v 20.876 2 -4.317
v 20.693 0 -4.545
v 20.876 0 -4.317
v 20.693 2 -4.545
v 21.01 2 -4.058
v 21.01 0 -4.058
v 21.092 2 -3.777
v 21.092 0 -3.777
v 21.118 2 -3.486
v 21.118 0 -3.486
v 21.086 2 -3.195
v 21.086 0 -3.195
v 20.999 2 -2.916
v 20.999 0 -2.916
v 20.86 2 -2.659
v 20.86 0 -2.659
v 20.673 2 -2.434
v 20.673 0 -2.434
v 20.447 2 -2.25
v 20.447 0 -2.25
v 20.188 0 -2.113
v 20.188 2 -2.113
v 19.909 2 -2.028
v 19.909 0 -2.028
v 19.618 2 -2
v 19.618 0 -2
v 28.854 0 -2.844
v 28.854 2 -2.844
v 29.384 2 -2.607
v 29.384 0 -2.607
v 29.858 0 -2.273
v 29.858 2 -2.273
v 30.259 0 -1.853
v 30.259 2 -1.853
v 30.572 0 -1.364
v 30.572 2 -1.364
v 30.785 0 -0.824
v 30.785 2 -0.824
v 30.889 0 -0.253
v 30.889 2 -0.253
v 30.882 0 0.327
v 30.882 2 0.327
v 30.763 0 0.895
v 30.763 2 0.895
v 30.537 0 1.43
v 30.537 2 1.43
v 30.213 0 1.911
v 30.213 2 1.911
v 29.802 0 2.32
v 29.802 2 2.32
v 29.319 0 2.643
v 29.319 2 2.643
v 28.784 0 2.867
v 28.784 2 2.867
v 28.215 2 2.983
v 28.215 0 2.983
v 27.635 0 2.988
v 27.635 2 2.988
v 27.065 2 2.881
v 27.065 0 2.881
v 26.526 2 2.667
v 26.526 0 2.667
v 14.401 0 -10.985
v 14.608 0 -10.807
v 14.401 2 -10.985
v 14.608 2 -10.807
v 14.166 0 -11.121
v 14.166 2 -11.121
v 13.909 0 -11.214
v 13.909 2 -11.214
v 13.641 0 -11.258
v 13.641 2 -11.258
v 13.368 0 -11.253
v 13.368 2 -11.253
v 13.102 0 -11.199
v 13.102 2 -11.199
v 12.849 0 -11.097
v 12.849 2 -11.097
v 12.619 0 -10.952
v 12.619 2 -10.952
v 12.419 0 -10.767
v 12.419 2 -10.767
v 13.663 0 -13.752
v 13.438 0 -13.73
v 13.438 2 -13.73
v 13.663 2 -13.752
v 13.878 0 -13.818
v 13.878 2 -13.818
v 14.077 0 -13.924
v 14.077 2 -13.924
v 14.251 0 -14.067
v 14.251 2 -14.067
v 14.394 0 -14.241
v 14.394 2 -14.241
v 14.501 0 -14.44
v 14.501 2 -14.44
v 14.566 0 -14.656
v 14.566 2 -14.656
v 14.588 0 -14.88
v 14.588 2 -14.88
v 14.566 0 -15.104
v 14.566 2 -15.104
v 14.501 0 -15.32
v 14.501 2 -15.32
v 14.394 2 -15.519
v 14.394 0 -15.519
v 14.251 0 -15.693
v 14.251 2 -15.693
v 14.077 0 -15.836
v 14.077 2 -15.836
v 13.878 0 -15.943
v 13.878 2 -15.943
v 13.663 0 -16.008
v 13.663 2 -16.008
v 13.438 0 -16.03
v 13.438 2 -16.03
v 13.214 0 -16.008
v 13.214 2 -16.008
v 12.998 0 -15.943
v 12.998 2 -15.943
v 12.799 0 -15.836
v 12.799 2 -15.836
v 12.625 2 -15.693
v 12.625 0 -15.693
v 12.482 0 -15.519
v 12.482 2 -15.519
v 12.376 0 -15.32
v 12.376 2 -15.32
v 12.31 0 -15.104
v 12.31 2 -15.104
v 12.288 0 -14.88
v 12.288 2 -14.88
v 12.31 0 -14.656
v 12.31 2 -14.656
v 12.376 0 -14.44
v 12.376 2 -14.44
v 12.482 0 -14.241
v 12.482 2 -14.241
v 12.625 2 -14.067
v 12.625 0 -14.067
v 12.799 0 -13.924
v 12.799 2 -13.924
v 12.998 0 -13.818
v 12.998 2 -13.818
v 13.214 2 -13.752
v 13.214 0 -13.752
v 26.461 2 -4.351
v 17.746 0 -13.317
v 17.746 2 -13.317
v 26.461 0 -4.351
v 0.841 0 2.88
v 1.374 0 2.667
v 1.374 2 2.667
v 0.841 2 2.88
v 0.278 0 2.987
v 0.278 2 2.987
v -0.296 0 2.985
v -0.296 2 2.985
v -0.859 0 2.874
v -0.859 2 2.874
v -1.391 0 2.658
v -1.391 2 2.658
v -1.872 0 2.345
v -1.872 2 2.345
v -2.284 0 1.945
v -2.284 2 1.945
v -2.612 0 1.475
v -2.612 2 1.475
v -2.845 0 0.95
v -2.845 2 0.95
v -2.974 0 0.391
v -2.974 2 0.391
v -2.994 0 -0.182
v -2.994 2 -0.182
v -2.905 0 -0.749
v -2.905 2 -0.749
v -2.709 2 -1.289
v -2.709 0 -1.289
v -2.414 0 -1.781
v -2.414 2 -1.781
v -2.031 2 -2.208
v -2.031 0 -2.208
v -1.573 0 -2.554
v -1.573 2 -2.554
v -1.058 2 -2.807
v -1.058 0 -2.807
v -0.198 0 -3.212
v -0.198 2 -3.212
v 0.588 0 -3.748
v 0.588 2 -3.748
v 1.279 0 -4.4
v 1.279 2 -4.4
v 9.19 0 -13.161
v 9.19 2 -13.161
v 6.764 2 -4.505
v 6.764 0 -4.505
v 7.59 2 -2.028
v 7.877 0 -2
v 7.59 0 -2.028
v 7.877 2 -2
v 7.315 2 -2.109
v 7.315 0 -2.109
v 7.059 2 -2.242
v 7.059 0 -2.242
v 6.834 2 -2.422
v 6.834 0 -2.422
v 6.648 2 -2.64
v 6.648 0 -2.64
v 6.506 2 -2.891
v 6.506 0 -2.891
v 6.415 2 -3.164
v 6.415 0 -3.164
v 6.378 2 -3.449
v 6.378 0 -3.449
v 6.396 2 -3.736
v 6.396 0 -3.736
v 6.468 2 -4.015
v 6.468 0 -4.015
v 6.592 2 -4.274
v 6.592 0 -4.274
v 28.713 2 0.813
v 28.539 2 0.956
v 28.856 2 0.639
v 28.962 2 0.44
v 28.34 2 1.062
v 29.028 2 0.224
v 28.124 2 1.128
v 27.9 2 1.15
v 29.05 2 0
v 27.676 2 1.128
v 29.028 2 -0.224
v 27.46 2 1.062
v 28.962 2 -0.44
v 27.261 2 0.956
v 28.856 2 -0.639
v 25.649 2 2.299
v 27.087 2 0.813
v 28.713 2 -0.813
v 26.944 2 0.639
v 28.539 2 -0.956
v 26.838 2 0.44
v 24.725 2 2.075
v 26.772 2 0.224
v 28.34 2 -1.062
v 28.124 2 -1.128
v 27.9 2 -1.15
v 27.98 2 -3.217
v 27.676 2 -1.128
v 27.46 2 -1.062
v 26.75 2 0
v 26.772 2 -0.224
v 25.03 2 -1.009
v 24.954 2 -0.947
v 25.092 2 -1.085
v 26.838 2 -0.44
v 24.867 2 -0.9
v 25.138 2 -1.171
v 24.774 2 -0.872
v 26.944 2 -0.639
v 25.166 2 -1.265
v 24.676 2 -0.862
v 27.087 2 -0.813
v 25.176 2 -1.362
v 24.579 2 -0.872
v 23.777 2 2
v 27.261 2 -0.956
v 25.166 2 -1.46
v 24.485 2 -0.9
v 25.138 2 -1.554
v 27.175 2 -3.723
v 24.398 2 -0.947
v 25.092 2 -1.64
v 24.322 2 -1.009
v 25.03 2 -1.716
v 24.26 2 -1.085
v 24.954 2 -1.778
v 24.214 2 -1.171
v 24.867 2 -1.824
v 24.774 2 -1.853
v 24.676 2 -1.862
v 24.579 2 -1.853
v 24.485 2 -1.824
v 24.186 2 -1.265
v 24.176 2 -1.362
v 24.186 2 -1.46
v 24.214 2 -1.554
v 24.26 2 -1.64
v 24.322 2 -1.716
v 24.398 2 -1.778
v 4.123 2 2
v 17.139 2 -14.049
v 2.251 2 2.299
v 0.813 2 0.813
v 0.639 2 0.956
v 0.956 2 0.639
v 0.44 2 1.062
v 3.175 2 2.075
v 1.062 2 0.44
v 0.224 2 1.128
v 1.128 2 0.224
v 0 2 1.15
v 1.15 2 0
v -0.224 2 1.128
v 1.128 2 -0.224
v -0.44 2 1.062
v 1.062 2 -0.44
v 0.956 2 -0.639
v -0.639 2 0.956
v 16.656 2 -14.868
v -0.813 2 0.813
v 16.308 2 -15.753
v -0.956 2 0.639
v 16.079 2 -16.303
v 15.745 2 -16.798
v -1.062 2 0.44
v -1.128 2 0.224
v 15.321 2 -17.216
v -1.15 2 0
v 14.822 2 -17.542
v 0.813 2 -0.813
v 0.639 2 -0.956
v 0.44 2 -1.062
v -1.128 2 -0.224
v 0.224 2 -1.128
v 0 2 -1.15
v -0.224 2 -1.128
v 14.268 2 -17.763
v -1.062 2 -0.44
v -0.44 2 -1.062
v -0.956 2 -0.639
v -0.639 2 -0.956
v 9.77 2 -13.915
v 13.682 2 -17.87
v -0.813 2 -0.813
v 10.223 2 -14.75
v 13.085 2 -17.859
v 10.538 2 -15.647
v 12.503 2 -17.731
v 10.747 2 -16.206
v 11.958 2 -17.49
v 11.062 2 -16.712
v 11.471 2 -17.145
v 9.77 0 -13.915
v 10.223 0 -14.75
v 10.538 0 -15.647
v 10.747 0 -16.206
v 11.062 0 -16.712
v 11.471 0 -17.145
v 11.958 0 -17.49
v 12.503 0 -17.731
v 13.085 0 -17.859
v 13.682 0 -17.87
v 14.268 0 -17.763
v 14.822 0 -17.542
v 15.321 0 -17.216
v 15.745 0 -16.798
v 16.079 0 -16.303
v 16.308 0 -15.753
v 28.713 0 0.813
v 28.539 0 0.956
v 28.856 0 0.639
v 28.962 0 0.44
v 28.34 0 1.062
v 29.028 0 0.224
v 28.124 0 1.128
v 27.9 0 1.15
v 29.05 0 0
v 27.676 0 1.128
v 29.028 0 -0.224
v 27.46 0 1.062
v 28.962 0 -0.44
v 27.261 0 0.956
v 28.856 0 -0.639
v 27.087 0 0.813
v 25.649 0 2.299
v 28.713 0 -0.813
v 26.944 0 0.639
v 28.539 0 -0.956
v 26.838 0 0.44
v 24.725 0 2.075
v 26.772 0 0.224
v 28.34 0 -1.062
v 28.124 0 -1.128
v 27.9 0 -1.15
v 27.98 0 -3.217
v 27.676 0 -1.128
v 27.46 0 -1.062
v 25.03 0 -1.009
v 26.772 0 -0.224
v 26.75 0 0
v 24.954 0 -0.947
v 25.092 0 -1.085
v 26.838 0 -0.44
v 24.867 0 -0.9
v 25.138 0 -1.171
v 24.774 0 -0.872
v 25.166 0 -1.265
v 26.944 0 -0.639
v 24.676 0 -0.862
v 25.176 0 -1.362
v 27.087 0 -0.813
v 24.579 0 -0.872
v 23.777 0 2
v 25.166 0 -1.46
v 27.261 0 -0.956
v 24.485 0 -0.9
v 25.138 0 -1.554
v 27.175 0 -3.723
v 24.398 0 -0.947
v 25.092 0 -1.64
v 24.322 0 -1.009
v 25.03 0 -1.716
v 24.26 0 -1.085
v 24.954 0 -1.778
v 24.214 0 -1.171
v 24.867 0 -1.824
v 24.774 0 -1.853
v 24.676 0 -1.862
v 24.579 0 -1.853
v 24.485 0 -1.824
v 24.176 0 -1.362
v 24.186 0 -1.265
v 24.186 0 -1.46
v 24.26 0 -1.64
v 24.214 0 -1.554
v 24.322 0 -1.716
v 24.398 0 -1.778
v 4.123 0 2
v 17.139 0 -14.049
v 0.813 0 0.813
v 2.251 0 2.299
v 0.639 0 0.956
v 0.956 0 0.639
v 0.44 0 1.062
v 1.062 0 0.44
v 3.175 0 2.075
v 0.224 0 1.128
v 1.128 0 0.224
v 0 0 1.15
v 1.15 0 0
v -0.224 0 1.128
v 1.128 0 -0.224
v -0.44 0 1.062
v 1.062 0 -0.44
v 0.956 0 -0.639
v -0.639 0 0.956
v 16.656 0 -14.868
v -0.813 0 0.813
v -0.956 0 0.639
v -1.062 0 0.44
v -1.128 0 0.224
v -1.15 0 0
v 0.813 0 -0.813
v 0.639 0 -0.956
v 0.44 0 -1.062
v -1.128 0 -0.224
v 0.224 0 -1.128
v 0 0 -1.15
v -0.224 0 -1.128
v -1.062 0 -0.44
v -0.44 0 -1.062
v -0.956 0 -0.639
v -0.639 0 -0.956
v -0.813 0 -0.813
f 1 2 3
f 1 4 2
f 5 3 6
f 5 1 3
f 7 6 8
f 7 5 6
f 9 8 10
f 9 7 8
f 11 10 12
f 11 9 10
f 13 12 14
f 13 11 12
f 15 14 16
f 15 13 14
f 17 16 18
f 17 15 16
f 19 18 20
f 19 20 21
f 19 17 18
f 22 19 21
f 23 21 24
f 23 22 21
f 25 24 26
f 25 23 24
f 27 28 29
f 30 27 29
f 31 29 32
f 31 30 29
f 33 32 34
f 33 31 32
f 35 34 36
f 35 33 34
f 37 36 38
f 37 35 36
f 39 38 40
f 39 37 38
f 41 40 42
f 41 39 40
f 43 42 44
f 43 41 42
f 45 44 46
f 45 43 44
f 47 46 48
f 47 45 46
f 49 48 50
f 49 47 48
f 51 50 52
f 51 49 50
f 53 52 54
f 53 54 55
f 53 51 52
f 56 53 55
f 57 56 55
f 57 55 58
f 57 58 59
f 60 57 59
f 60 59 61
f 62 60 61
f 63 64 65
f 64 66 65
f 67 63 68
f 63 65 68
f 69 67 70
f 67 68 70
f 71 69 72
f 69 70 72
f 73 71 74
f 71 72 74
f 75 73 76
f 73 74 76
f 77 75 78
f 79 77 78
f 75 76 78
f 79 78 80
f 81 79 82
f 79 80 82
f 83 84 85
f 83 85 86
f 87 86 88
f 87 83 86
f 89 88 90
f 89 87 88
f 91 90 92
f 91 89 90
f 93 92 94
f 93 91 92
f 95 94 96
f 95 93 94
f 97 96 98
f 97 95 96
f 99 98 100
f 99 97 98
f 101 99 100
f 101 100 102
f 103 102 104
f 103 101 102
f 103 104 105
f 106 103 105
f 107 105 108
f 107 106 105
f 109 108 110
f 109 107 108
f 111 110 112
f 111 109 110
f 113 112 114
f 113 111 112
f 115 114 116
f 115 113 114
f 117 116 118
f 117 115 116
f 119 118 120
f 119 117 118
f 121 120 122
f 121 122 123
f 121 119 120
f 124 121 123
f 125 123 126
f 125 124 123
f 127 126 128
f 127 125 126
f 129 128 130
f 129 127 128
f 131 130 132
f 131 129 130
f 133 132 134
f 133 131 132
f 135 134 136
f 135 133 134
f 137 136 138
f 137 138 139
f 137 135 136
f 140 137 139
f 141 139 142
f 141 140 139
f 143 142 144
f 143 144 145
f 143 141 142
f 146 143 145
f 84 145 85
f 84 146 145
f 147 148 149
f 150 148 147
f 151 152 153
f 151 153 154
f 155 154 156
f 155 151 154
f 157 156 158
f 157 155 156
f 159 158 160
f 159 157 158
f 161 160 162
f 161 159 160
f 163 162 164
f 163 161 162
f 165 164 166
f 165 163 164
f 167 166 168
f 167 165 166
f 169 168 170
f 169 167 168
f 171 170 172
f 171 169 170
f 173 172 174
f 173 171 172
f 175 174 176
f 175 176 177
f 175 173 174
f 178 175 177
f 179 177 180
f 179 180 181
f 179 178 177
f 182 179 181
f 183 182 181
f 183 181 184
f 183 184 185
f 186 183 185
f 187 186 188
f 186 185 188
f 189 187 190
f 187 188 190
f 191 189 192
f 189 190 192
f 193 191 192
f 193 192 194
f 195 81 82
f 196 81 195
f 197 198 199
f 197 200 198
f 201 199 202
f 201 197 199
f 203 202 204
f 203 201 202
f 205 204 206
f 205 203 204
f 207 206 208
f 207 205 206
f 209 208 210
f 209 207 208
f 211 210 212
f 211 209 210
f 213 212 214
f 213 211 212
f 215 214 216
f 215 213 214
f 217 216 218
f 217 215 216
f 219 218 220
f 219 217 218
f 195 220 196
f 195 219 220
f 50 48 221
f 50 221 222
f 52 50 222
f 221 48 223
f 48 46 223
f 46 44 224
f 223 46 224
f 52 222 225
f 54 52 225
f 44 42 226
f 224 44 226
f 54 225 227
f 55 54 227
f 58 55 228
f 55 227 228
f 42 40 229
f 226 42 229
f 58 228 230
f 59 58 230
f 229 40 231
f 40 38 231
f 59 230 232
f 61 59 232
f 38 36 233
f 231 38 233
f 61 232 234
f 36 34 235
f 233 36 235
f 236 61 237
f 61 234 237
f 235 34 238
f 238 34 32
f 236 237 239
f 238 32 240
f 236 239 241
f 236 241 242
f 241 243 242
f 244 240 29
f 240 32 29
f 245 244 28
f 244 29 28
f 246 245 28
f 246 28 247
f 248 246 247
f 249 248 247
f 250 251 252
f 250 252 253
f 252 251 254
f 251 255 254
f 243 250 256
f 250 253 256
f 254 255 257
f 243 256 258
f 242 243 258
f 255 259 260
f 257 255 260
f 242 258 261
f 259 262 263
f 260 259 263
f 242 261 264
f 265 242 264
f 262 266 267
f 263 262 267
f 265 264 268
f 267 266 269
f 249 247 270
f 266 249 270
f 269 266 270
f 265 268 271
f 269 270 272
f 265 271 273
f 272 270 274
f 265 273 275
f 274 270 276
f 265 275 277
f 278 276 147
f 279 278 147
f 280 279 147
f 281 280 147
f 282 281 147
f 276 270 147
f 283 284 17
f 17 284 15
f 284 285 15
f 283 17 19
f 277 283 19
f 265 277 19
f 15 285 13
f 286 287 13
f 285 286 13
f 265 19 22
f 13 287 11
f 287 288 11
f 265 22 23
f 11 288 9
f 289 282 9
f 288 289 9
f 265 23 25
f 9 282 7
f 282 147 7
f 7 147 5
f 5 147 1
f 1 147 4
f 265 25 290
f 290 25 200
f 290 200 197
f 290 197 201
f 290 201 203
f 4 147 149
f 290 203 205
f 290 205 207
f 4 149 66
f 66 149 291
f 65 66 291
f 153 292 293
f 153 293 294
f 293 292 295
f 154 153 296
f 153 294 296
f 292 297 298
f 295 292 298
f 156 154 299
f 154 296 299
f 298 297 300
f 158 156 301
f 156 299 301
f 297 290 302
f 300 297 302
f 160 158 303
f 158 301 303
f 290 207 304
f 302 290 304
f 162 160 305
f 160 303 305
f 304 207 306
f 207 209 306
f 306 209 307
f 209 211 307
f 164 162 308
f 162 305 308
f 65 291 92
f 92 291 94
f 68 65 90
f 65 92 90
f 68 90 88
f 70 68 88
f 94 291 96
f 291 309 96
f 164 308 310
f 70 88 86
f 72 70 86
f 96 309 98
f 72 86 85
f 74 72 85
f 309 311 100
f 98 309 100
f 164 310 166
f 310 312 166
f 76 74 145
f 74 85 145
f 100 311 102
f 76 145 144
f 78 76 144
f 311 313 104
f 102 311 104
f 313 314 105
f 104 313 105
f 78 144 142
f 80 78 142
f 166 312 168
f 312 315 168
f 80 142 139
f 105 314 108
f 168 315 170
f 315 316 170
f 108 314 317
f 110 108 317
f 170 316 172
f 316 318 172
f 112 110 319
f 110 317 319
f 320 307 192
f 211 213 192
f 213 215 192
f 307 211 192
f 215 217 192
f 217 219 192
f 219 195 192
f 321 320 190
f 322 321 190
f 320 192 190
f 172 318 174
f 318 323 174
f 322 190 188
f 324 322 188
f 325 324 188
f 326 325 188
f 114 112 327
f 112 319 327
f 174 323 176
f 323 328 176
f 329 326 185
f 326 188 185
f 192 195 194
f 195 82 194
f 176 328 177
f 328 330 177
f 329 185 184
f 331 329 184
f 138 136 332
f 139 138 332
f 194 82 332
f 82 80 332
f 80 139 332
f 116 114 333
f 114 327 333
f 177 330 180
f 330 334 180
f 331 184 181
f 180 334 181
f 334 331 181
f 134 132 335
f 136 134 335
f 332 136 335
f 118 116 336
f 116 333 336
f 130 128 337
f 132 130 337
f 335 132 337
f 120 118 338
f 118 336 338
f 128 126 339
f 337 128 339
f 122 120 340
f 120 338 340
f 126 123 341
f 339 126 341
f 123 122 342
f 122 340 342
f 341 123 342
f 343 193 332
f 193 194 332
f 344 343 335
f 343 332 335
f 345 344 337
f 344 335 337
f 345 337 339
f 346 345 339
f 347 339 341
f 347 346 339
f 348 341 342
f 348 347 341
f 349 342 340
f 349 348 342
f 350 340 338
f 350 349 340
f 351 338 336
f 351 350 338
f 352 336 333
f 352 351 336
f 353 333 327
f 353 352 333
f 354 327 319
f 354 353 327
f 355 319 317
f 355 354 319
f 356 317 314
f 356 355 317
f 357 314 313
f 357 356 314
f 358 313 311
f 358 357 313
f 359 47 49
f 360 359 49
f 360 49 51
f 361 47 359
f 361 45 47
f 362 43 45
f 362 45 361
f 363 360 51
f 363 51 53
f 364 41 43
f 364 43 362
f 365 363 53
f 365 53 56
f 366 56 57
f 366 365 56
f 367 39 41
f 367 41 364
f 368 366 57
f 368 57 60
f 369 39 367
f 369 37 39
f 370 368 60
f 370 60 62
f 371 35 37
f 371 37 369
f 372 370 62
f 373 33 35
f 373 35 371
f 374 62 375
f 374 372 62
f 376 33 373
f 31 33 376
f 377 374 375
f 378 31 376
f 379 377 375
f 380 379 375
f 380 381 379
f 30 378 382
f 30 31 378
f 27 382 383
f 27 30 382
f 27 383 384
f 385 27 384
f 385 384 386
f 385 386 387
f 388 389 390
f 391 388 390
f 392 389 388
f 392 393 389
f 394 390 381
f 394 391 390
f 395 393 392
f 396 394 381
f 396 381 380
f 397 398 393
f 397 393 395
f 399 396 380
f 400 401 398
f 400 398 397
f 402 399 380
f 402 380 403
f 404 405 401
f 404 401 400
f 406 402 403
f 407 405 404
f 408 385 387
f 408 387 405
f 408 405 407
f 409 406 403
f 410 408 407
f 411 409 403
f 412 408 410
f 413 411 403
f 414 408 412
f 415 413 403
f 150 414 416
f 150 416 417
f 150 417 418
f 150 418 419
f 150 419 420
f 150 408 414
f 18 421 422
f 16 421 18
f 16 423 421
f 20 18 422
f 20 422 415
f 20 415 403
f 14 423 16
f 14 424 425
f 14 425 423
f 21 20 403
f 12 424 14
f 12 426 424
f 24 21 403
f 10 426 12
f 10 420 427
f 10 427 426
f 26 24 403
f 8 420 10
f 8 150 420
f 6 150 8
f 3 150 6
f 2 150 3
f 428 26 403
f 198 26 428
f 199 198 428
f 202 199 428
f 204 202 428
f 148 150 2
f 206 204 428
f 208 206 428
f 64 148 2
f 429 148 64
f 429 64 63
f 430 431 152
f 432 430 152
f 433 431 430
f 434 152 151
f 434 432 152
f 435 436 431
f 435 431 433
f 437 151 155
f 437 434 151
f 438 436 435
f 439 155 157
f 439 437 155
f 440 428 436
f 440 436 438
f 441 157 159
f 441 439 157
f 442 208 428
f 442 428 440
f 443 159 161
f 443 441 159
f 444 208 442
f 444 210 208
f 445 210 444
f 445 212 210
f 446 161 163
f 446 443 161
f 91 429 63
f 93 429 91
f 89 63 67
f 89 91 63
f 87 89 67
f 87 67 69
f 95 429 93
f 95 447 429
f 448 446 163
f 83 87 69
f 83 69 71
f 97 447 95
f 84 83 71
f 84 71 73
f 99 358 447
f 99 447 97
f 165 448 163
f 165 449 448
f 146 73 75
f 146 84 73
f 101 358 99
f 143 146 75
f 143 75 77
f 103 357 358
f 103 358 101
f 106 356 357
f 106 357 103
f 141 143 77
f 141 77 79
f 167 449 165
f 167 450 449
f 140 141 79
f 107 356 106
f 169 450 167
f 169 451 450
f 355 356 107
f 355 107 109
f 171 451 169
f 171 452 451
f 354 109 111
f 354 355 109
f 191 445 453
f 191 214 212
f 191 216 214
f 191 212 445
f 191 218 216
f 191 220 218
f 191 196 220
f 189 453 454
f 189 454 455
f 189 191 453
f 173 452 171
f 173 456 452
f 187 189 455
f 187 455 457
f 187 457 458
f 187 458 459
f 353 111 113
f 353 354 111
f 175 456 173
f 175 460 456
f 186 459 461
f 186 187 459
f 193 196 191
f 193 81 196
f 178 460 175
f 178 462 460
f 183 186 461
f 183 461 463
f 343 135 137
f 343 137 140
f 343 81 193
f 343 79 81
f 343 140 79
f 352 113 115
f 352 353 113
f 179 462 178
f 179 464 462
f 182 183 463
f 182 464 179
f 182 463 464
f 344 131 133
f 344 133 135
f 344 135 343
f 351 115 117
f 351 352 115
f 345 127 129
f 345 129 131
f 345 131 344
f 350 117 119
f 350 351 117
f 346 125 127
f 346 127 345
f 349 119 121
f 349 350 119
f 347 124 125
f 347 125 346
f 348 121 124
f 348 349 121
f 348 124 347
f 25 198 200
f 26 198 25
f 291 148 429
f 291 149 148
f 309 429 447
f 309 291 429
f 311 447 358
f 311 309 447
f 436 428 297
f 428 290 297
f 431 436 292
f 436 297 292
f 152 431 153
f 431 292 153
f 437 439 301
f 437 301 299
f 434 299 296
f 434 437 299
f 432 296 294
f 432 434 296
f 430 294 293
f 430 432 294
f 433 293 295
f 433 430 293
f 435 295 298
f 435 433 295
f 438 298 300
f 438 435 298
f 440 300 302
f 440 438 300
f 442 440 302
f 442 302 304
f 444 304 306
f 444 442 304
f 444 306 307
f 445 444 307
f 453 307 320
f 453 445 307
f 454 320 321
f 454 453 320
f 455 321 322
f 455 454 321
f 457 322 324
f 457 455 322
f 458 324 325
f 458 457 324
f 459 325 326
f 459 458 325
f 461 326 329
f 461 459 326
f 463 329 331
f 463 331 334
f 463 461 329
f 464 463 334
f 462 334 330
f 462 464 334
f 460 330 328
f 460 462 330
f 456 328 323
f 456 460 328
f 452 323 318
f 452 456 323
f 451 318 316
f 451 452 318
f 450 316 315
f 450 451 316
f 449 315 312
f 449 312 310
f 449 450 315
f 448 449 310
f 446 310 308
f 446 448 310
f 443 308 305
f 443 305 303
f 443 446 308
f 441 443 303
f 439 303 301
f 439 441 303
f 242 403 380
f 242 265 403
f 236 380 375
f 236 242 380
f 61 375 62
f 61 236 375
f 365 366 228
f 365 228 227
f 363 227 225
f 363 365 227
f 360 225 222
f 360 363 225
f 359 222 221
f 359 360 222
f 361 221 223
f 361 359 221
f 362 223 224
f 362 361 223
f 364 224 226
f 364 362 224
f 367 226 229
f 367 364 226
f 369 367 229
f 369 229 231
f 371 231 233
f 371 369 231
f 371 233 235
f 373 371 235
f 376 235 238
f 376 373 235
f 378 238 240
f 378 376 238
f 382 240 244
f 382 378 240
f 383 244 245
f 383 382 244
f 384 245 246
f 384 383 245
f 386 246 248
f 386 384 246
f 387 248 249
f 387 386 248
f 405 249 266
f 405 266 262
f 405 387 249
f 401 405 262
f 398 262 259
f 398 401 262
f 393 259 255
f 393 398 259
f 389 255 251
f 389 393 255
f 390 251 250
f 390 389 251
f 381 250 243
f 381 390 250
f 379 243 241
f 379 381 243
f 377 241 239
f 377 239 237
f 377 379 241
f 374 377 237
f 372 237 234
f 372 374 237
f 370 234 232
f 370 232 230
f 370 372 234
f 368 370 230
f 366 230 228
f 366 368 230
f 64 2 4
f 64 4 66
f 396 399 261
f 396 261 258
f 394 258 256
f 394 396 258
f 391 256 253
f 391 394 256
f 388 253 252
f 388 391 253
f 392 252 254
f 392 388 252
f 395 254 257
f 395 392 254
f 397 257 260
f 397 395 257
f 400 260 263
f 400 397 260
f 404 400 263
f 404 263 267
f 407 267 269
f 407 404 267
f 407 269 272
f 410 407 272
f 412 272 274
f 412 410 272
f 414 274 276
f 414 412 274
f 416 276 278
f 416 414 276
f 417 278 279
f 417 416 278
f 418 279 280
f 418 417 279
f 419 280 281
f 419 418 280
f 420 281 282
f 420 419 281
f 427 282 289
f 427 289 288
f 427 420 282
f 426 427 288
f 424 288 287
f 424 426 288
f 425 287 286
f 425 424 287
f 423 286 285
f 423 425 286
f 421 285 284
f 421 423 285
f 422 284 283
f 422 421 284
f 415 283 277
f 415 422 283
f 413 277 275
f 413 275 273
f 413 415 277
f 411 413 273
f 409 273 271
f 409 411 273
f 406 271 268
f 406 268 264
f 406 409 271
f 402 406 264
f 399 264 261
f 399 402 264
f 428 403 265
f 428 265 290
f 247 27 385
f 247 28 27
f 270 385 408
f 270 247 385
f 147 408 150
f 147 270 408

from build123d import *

# Parameters (mm, degrees)
SKETCH_1_R      = 1.15
SKETCH_1_R_2    = 0.5
EXTRUDE_1_DEPTH = 2
FILLET_1_R      = 6
FILLET_2_R      = 1.5


with BuildPart() as part:
    # Эскиз1 → Бобышка-Вытянуть1 (new body)
    with BuildSketch(Plane(origin=(0, 0, 0), x_dir=(1, 0, 0), z_dir=(0, 1, 0))):
        with BuildLine():
            Line((25.663932023, -2), (2.236067977, -2))
            ThreePointArc((2.236067977, -2), (-2.74154128, -1.218175444), (0.014385141, 2.999965511))
            Line((0.014385141, 2.999965511), (10.455183999, 14.561088615))
            ThreePointArc((10.455183999, 14.561088615), (13.383244259, 17.879619162), (16.430840693, 14.670516819))
            Line((16.430840693, 14.670516819), (27.775788612, 2.997427486))
            ThreePointArc((27.775788612, 2.997427486), (30.663385612, -1.167775647), (25.663932023, -2))
        make_face()
        with Locations(Location((0, 0, 0), (0, 0, 270))):
            Circle(SKETCH_1_R, mode=Mode.SUBTRACT)
        with Locations(Location((27.9, 0, 0), (0, 0, 270))):
            Circle(SKETCH_1_R, mode=Mode.SUBTRACT)
        with Locations(Location((13.438172043, 14.880122047, 0), (0, 0, 270))):
            Circle(SKETCH_1_R, mode=Mode.SUBTRACT)
        with Locations(Location((24.67605012, 1.362404921, 0), (0, 0, 270))):
            Circle(SKETCH_1_R_2, mode=Mode.SUBTRACT)
        Polygon((13.491730689, 11.955390865), (4.501061475, 2), (23.167266244, 2), align=None, mode=Mode.SUBTRACT)
    extrude(amount=EXTRUDE_1_DEPTH)

    # Скругление1
    fillet_1_edges = [part.edges().sort_by_distance(p)[0] for p in [
        (10.455183999, 1, -14.561088615),
        (16.430840693, 1, -14.670516819),
        (27.775788612, 1, -2.997427486),
        (25.663932023, 1, 2),
        (2.236067977, 1, 2),
        (0.014385141, 1, -2.999965511),
    ]]
    fillet(fillet_1_edges, radius=FILLET_1_R)

    # Скругление2
    fillet_2_edges = [part.edges().sort_by_distance(p)[0] for p in [
        (4.501061475, 1, -2),
        (23.167266244, 1, -2),
        (13.491730689, 1, -11.955390865),
    ]]
    fillet(fillet_2_edges, radius=FILLET_2_R)


solid = part.part
